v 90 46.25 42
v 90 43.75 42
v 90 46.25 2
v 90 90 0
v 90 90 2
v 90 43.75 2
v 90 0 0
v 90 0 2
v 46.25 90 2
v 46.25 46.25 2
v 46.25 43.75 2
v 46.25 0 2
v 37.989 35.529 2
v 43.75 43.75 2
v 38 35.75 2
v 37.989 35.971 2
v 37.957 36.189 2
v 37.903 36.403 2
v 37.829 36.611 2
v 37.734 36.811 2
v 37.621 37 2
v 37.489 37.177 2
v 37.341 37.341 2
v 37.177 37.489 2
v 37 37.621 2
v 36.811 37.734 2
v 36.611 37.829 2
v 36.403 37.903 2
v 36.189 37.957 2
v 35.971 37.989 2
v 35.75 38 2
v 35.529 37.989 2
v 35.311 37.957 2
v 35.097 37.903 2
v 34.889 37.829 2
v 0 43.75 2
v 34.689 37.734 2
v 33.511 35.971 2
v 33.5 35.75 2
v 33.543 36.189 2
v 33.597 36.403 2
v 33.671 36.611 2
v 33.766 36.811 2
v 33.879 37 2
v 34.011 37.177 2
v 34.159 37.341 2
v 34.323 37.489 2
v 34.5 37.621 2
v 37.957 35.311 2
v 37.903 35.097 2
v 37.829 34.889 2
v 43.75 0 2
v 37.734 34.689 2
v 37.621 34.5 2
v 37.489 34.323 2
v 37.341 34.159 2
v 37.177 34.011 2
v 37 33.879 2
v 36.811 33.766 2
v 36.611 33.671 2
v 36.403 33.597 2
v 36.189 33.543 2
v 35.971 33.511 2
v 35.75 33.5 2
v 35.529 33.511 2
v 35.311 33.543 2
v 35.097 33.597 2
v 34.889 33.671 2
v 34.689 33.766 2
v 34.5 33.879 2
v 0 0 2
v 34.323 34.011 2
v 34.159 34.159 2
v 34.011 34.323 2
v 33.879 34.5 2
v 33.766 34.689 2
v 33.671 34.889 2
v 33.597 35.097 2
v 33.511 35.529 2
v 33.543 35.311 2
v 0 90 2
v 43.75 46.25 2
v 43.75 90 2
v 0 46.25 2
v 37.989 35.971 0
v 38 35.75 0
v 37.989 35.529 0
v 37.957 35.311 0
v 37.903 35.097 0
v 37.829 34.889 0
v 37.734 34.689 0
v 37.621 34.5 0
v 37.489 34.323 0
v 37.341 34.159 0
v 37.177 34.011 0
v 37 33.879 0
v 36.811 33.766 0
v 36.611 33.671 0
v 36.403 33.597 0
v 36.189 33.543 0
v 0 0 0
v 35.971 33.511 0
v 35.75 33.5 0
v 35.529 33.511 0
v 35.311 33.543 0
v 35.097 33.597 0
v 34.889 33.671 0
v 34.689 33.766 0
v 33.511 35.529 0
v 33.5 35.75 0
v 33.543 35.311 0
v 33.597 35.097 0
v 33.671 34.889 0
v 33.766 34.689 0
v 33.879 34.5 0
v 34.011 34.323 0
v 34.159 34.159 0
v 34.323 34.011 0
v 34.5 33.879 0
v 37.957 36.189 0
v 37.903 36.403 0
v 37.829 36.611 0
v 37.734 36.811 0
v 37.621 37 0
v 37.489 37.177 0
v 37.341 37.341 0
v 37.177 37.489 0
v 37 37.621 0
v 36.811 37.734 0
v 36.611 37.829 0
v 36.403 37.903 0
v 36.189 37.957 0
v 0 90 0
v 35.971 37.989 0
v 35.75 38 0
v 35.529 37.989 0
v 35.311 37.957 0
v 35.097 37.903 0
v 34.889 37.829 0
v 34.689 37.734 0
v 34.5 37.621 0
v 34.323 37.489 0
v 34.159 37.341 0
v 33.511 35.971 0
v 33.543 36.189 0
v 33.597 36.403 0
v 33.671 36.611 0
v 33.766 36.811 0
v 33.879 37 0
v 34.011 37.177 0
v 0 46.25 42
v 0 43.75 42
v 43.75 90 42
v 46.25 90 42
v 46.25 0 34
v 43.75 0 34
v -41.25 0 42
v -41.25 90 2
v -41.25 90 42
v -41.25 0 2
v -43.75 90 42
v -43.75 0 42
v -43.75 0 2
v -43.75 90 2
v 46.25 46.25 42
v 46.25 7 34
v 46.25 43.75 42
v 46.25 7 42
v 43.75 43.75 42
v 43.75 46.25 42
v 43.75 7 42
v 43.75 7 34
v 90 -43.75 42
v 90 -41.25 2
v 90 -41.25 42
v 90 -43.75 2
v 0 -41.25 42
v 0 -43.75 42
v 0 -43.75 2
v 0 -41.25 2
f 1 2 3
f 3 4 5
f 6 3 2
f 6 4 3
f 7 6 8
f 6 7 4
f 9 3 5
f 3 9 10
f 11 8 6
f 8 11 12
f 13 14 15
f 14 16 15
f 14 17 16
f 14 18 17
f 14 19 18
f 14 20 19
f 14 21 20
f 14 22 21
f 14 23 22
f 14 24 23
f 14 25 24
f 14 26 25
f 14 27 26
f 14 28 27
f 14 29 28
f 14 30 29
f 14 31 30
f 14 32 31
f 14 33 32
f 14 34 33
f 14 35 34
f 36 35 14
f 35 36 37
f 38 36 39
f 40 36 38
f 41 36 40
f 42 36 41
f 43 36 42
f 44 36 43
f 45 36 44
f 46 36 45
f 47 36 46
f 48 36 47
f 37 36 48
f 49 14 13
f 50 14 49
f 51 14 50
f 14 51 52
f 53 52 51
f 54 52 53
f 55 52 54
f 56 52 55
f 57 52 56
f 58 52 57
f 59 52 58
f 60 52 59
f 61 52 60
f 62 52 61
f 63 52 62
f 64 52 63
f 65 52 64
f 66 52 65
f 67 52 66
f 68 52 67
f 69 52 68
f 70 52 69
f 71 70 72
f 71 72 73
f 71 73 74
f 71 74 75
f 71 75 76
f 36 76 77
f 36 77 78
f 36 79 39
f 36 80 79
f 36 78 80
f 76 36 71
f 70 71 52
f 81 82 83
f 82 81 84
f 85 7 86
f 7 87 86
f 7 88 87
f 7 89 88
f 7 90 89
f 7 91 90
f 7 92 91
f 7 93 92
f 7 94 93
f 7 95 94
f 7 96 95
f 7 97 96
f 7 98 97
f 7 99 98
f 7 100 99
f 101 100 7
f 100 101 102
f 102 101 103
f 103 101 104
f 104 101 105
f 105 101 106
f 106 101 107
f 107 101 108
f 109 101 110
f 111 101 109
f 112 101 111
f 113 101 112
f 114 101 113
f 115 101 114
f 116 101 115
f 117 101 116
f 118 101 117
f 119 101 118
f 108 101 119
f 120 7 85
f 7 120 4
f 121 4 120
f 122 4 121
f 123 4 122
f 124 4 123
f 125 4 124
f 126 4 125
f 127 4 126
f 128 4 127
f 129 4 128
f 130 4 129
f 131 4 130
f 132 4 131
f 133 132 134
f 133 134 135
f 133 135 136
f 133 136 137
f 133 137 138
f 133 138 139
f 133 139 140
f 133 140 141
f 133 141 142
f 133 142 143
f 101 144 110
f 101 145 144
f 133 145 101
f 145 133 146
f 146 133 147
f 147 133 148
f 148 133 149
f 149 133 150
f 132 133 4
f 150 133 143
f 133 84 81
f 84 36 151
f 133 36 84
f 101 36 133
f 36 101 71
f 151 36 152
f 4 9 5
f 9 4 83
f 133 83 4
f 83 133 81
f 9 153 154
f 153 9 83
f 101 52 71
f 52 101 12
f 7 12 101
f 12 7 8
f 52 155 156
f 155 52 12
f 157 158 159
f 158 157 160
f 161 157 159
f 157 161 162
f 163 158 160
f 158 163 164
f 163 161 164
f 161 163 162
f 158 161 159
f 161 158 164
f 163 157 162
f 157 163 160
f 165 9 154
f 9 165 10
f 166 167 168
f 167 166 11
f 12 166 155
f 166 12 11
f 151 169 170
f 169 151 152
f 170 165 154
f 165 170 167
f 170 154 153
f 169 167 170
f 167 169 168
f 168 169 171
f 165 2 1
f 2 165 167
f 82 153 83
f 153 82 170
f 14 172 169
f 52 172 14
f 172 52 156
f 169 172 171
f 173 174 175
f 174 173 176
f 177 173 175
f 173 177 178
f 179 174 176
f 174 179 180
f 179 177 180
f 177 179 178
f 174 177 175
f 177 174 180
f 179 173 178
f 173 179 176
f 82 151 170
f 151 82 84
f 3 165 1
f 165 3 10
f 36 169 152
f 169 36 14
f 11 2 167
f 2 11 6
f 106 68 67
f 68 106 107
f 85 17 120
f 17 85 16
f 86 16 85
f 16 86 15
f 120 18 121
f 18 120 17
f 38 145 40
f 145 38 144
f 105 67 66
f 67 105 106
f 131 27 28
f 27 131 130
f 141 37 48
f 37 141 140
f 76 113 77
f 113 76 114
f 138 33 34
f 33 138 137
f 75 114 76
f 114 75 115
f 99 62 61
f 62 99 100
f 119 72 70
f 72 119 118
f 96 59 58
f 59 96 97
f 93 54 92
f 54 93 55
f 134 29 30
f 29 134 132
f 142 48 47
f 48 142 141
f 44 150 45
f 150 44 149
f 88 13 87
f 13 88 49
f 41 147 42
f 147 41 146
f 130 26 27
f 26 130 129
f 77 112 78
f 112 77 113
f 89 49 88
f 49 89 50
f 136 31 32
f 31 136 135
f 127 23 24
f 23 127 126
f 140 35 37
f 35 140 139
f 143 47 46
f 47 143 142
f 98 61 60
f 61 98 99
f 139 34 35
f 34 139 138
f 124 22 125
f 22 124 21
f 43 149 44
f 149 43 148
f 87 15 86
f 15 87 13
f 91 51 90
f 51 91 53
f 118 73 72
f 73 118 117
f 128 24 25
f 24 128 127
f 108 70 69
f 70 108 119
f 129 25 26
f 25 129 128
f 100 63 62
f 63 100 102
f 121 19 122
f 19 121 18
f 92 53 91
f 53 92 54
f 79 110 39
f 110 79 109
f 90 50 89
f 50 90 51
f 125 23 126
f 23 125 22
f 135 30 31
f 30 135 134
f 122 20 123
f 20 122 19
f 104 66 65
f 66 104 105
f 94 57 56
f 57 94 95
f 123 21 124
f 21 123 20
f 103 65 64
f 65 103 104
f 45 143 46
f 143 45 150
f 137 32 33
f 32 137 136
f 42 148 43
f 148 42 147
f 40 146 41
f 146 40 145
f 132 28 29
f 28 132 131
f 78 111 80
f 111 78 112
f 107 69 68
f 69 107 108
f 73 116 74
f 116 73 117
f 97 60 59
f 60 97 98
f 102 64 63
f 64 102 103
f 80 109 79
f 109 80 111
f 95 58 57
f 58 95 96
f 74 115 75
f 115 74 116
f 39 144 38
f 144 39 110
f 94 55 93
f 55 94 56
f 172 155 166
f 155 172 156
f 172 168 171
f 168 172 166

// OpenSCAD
// --- Dimensions in Millimeters ---

// Overall housing dimensions
outer_x = 90;    // Outer width of the box (X)
outer_y = 90;    // Outer depth of the box (Y)
top_plate_thickness = 2; // Thickness of the top plate (Z from 0 to 2)
wall_height = 40; // Height of the walls above the top plate (Total height is 42mm, but wall rises to Z=40)
wall_thickness = 2.5; // Thickness of the four side walls

// Screw hole dimensions
screw_hole_diameter = 4.5; // Diameter for M4 screw holes
screw_pattern_size = 71.5; // Side length of the square pattern for mounting holes

// Cable notch dimensions (on one wall)
notch_width = 12;      // Width of the cable notch
notch_depth = 8;       // Depth of the cable notch from the open edge (Z=40 down to Z=32)

// Rendering settings
$fn = 64;

// --- Module Definitions ---

// Function to create a rectangular prism centered at origin
module box(x, y, z) {
    cube([x, y, z]);
}

// --- Main Assembly ---

difference() {
    // 1. The main outer shell structure (Union of top plate and walls)

    union() {
        // A. Top Plate (Lies on Z=0 plane, thickness = 2mm)
        translate([0, 0, 0]) {
            box(outer_x, outer_y, top_plate_thickness);
        }

        // B. Walls (Four vertical walls rising from the top plate)
        // The inner dimensions are calculated based on outer size and wall thickness.
        inner_x = outer_x - 2 * wall_thickness;
        inner_y = outer_y - 2 * wall_thickness;

        // Wall 1: Front (Parallel to Y-axis, centered in X)
        translate([-(outer_x/2) + wall_thickness/2, 0, top_plate_thickness]) {
            box(wall_thickness, outer_y, wall_height);
        }

        // Wall 2: Back (Parallel to Y-axis, centered in X)
        translate([(outer_x/2) - wall_thickness/2, 0, top_plate_thickness]) {
            box(wall_thickness, outer_y, wall_height);
        }

        // Wall 3: Left (Parallel to X-axis, centered in Y)
        translate([0, -(outer_y/2) + wall_thickness/2, top_plate_thickness]) {
            box(outer_x, wall_thickness, wall_height);
        }

        // Wall 4: Right (Parallel to X-axis, centered in Y)
        translate([0, (outer_y/2) - wall_thickness/2, top_plate_thickness]) {
            box(outer_x, wall_thickness, wall_height);
        }
    }

    // 2. Cutouts (Subtractions)

    // A. Screw Holes in the Top Plate (Z=0 to Z=2)
    for (i = [-1, 1]) { // X positions relative to center
        for (j = [-1, 1]) { // Y positions relative to center
            translate([
                (screw_pattern_size/2) * i,
                (screw_pattern_size/2) * j,
                -0.1 // Start slightly below Z=0 for clean cut
            ]) {
                cylinder(h = top_plate_thickness + 0.2, r = screw_hole_diameter / 2);
            }
        }
    }

    // B. Cable Notch in one wall (Let's choose the Right Wall: X = outer_x/2 - wall_thickness/2)
    // The right wall is defined by X > (outer_x/2) - wall_thickness/2 and Y between -(outer_y/2) + wall_thickness/2 and (outer_y/2) - wall_thickness/2.
    // We cut into the solid structure from the outside face of this wall.

    // The right wall's X position is: R_wall_X = outer_x/2 - wall_thickness/2
    right_wall_center_x = (outer_x / 2) - (wall_thickness / 2);

    translate([
        right_wall_center_x, // Position along X axis of the right wall
        0,                    // Centered in Y for simplicity, though it spans the full height/width of the wall section
        top_plate_thickness  // Start cutting from the top surface (Z=2) downwards
    ]) {
        // The notch is 12mm wide (along X direction if viewed from side), and reaches 8mm down from Z=40.
        // Since we are cutting into the wall, its length should be along Y axis for a standard cable entry slot.

        // Let's define the cut shape: A rectangle centered on the right wall face (Y-axis span)
        // The notch is 12mm wide (along X direction of the wall thickness), and reaches 8mm down from Z=40.
        // Wait, the description says: "notch for the power cable: 12 mm wide, centred along the wall, reaching 8 mm down from the open edge (from z = 32 to z = 40)."

        // The right wall spans Y from -(outer_y/2) + wall_thickness/2 to (outer_y/2) - wall_thickness/2.
        // Centered along the wall means centered in Y.
        notch_center_y = 0; // Center of the wall section in Y

        // The notch is 12mm wide (this must be the dimension parallel to the X-axis if we are cutting through the thickness, but it's usually the length along the wall).
        // Assuming "12 mm wide" means the span along the Y direction of the slot.
        notch_span_y = notch_width; // 12mm span in Y

        // The depth is 8mm from Z=40, meaning it goes from Z=32 to Z=40.
        // Since we start cutting at Z=top_plate_thickness (Z=2), this cut must go through the wall structure up to Z=40.

        // We model a rectangular prism that cuts into the right wall:
        translate([0, -notch_span_y/2, 32]) { // Start cutting at Z=32 (8mm down from Z=40)
            box(wall_thickness + 1, notch_span_y + 1, 8); // Extend slightly past the wall thickness and height range
        }
    }
}
